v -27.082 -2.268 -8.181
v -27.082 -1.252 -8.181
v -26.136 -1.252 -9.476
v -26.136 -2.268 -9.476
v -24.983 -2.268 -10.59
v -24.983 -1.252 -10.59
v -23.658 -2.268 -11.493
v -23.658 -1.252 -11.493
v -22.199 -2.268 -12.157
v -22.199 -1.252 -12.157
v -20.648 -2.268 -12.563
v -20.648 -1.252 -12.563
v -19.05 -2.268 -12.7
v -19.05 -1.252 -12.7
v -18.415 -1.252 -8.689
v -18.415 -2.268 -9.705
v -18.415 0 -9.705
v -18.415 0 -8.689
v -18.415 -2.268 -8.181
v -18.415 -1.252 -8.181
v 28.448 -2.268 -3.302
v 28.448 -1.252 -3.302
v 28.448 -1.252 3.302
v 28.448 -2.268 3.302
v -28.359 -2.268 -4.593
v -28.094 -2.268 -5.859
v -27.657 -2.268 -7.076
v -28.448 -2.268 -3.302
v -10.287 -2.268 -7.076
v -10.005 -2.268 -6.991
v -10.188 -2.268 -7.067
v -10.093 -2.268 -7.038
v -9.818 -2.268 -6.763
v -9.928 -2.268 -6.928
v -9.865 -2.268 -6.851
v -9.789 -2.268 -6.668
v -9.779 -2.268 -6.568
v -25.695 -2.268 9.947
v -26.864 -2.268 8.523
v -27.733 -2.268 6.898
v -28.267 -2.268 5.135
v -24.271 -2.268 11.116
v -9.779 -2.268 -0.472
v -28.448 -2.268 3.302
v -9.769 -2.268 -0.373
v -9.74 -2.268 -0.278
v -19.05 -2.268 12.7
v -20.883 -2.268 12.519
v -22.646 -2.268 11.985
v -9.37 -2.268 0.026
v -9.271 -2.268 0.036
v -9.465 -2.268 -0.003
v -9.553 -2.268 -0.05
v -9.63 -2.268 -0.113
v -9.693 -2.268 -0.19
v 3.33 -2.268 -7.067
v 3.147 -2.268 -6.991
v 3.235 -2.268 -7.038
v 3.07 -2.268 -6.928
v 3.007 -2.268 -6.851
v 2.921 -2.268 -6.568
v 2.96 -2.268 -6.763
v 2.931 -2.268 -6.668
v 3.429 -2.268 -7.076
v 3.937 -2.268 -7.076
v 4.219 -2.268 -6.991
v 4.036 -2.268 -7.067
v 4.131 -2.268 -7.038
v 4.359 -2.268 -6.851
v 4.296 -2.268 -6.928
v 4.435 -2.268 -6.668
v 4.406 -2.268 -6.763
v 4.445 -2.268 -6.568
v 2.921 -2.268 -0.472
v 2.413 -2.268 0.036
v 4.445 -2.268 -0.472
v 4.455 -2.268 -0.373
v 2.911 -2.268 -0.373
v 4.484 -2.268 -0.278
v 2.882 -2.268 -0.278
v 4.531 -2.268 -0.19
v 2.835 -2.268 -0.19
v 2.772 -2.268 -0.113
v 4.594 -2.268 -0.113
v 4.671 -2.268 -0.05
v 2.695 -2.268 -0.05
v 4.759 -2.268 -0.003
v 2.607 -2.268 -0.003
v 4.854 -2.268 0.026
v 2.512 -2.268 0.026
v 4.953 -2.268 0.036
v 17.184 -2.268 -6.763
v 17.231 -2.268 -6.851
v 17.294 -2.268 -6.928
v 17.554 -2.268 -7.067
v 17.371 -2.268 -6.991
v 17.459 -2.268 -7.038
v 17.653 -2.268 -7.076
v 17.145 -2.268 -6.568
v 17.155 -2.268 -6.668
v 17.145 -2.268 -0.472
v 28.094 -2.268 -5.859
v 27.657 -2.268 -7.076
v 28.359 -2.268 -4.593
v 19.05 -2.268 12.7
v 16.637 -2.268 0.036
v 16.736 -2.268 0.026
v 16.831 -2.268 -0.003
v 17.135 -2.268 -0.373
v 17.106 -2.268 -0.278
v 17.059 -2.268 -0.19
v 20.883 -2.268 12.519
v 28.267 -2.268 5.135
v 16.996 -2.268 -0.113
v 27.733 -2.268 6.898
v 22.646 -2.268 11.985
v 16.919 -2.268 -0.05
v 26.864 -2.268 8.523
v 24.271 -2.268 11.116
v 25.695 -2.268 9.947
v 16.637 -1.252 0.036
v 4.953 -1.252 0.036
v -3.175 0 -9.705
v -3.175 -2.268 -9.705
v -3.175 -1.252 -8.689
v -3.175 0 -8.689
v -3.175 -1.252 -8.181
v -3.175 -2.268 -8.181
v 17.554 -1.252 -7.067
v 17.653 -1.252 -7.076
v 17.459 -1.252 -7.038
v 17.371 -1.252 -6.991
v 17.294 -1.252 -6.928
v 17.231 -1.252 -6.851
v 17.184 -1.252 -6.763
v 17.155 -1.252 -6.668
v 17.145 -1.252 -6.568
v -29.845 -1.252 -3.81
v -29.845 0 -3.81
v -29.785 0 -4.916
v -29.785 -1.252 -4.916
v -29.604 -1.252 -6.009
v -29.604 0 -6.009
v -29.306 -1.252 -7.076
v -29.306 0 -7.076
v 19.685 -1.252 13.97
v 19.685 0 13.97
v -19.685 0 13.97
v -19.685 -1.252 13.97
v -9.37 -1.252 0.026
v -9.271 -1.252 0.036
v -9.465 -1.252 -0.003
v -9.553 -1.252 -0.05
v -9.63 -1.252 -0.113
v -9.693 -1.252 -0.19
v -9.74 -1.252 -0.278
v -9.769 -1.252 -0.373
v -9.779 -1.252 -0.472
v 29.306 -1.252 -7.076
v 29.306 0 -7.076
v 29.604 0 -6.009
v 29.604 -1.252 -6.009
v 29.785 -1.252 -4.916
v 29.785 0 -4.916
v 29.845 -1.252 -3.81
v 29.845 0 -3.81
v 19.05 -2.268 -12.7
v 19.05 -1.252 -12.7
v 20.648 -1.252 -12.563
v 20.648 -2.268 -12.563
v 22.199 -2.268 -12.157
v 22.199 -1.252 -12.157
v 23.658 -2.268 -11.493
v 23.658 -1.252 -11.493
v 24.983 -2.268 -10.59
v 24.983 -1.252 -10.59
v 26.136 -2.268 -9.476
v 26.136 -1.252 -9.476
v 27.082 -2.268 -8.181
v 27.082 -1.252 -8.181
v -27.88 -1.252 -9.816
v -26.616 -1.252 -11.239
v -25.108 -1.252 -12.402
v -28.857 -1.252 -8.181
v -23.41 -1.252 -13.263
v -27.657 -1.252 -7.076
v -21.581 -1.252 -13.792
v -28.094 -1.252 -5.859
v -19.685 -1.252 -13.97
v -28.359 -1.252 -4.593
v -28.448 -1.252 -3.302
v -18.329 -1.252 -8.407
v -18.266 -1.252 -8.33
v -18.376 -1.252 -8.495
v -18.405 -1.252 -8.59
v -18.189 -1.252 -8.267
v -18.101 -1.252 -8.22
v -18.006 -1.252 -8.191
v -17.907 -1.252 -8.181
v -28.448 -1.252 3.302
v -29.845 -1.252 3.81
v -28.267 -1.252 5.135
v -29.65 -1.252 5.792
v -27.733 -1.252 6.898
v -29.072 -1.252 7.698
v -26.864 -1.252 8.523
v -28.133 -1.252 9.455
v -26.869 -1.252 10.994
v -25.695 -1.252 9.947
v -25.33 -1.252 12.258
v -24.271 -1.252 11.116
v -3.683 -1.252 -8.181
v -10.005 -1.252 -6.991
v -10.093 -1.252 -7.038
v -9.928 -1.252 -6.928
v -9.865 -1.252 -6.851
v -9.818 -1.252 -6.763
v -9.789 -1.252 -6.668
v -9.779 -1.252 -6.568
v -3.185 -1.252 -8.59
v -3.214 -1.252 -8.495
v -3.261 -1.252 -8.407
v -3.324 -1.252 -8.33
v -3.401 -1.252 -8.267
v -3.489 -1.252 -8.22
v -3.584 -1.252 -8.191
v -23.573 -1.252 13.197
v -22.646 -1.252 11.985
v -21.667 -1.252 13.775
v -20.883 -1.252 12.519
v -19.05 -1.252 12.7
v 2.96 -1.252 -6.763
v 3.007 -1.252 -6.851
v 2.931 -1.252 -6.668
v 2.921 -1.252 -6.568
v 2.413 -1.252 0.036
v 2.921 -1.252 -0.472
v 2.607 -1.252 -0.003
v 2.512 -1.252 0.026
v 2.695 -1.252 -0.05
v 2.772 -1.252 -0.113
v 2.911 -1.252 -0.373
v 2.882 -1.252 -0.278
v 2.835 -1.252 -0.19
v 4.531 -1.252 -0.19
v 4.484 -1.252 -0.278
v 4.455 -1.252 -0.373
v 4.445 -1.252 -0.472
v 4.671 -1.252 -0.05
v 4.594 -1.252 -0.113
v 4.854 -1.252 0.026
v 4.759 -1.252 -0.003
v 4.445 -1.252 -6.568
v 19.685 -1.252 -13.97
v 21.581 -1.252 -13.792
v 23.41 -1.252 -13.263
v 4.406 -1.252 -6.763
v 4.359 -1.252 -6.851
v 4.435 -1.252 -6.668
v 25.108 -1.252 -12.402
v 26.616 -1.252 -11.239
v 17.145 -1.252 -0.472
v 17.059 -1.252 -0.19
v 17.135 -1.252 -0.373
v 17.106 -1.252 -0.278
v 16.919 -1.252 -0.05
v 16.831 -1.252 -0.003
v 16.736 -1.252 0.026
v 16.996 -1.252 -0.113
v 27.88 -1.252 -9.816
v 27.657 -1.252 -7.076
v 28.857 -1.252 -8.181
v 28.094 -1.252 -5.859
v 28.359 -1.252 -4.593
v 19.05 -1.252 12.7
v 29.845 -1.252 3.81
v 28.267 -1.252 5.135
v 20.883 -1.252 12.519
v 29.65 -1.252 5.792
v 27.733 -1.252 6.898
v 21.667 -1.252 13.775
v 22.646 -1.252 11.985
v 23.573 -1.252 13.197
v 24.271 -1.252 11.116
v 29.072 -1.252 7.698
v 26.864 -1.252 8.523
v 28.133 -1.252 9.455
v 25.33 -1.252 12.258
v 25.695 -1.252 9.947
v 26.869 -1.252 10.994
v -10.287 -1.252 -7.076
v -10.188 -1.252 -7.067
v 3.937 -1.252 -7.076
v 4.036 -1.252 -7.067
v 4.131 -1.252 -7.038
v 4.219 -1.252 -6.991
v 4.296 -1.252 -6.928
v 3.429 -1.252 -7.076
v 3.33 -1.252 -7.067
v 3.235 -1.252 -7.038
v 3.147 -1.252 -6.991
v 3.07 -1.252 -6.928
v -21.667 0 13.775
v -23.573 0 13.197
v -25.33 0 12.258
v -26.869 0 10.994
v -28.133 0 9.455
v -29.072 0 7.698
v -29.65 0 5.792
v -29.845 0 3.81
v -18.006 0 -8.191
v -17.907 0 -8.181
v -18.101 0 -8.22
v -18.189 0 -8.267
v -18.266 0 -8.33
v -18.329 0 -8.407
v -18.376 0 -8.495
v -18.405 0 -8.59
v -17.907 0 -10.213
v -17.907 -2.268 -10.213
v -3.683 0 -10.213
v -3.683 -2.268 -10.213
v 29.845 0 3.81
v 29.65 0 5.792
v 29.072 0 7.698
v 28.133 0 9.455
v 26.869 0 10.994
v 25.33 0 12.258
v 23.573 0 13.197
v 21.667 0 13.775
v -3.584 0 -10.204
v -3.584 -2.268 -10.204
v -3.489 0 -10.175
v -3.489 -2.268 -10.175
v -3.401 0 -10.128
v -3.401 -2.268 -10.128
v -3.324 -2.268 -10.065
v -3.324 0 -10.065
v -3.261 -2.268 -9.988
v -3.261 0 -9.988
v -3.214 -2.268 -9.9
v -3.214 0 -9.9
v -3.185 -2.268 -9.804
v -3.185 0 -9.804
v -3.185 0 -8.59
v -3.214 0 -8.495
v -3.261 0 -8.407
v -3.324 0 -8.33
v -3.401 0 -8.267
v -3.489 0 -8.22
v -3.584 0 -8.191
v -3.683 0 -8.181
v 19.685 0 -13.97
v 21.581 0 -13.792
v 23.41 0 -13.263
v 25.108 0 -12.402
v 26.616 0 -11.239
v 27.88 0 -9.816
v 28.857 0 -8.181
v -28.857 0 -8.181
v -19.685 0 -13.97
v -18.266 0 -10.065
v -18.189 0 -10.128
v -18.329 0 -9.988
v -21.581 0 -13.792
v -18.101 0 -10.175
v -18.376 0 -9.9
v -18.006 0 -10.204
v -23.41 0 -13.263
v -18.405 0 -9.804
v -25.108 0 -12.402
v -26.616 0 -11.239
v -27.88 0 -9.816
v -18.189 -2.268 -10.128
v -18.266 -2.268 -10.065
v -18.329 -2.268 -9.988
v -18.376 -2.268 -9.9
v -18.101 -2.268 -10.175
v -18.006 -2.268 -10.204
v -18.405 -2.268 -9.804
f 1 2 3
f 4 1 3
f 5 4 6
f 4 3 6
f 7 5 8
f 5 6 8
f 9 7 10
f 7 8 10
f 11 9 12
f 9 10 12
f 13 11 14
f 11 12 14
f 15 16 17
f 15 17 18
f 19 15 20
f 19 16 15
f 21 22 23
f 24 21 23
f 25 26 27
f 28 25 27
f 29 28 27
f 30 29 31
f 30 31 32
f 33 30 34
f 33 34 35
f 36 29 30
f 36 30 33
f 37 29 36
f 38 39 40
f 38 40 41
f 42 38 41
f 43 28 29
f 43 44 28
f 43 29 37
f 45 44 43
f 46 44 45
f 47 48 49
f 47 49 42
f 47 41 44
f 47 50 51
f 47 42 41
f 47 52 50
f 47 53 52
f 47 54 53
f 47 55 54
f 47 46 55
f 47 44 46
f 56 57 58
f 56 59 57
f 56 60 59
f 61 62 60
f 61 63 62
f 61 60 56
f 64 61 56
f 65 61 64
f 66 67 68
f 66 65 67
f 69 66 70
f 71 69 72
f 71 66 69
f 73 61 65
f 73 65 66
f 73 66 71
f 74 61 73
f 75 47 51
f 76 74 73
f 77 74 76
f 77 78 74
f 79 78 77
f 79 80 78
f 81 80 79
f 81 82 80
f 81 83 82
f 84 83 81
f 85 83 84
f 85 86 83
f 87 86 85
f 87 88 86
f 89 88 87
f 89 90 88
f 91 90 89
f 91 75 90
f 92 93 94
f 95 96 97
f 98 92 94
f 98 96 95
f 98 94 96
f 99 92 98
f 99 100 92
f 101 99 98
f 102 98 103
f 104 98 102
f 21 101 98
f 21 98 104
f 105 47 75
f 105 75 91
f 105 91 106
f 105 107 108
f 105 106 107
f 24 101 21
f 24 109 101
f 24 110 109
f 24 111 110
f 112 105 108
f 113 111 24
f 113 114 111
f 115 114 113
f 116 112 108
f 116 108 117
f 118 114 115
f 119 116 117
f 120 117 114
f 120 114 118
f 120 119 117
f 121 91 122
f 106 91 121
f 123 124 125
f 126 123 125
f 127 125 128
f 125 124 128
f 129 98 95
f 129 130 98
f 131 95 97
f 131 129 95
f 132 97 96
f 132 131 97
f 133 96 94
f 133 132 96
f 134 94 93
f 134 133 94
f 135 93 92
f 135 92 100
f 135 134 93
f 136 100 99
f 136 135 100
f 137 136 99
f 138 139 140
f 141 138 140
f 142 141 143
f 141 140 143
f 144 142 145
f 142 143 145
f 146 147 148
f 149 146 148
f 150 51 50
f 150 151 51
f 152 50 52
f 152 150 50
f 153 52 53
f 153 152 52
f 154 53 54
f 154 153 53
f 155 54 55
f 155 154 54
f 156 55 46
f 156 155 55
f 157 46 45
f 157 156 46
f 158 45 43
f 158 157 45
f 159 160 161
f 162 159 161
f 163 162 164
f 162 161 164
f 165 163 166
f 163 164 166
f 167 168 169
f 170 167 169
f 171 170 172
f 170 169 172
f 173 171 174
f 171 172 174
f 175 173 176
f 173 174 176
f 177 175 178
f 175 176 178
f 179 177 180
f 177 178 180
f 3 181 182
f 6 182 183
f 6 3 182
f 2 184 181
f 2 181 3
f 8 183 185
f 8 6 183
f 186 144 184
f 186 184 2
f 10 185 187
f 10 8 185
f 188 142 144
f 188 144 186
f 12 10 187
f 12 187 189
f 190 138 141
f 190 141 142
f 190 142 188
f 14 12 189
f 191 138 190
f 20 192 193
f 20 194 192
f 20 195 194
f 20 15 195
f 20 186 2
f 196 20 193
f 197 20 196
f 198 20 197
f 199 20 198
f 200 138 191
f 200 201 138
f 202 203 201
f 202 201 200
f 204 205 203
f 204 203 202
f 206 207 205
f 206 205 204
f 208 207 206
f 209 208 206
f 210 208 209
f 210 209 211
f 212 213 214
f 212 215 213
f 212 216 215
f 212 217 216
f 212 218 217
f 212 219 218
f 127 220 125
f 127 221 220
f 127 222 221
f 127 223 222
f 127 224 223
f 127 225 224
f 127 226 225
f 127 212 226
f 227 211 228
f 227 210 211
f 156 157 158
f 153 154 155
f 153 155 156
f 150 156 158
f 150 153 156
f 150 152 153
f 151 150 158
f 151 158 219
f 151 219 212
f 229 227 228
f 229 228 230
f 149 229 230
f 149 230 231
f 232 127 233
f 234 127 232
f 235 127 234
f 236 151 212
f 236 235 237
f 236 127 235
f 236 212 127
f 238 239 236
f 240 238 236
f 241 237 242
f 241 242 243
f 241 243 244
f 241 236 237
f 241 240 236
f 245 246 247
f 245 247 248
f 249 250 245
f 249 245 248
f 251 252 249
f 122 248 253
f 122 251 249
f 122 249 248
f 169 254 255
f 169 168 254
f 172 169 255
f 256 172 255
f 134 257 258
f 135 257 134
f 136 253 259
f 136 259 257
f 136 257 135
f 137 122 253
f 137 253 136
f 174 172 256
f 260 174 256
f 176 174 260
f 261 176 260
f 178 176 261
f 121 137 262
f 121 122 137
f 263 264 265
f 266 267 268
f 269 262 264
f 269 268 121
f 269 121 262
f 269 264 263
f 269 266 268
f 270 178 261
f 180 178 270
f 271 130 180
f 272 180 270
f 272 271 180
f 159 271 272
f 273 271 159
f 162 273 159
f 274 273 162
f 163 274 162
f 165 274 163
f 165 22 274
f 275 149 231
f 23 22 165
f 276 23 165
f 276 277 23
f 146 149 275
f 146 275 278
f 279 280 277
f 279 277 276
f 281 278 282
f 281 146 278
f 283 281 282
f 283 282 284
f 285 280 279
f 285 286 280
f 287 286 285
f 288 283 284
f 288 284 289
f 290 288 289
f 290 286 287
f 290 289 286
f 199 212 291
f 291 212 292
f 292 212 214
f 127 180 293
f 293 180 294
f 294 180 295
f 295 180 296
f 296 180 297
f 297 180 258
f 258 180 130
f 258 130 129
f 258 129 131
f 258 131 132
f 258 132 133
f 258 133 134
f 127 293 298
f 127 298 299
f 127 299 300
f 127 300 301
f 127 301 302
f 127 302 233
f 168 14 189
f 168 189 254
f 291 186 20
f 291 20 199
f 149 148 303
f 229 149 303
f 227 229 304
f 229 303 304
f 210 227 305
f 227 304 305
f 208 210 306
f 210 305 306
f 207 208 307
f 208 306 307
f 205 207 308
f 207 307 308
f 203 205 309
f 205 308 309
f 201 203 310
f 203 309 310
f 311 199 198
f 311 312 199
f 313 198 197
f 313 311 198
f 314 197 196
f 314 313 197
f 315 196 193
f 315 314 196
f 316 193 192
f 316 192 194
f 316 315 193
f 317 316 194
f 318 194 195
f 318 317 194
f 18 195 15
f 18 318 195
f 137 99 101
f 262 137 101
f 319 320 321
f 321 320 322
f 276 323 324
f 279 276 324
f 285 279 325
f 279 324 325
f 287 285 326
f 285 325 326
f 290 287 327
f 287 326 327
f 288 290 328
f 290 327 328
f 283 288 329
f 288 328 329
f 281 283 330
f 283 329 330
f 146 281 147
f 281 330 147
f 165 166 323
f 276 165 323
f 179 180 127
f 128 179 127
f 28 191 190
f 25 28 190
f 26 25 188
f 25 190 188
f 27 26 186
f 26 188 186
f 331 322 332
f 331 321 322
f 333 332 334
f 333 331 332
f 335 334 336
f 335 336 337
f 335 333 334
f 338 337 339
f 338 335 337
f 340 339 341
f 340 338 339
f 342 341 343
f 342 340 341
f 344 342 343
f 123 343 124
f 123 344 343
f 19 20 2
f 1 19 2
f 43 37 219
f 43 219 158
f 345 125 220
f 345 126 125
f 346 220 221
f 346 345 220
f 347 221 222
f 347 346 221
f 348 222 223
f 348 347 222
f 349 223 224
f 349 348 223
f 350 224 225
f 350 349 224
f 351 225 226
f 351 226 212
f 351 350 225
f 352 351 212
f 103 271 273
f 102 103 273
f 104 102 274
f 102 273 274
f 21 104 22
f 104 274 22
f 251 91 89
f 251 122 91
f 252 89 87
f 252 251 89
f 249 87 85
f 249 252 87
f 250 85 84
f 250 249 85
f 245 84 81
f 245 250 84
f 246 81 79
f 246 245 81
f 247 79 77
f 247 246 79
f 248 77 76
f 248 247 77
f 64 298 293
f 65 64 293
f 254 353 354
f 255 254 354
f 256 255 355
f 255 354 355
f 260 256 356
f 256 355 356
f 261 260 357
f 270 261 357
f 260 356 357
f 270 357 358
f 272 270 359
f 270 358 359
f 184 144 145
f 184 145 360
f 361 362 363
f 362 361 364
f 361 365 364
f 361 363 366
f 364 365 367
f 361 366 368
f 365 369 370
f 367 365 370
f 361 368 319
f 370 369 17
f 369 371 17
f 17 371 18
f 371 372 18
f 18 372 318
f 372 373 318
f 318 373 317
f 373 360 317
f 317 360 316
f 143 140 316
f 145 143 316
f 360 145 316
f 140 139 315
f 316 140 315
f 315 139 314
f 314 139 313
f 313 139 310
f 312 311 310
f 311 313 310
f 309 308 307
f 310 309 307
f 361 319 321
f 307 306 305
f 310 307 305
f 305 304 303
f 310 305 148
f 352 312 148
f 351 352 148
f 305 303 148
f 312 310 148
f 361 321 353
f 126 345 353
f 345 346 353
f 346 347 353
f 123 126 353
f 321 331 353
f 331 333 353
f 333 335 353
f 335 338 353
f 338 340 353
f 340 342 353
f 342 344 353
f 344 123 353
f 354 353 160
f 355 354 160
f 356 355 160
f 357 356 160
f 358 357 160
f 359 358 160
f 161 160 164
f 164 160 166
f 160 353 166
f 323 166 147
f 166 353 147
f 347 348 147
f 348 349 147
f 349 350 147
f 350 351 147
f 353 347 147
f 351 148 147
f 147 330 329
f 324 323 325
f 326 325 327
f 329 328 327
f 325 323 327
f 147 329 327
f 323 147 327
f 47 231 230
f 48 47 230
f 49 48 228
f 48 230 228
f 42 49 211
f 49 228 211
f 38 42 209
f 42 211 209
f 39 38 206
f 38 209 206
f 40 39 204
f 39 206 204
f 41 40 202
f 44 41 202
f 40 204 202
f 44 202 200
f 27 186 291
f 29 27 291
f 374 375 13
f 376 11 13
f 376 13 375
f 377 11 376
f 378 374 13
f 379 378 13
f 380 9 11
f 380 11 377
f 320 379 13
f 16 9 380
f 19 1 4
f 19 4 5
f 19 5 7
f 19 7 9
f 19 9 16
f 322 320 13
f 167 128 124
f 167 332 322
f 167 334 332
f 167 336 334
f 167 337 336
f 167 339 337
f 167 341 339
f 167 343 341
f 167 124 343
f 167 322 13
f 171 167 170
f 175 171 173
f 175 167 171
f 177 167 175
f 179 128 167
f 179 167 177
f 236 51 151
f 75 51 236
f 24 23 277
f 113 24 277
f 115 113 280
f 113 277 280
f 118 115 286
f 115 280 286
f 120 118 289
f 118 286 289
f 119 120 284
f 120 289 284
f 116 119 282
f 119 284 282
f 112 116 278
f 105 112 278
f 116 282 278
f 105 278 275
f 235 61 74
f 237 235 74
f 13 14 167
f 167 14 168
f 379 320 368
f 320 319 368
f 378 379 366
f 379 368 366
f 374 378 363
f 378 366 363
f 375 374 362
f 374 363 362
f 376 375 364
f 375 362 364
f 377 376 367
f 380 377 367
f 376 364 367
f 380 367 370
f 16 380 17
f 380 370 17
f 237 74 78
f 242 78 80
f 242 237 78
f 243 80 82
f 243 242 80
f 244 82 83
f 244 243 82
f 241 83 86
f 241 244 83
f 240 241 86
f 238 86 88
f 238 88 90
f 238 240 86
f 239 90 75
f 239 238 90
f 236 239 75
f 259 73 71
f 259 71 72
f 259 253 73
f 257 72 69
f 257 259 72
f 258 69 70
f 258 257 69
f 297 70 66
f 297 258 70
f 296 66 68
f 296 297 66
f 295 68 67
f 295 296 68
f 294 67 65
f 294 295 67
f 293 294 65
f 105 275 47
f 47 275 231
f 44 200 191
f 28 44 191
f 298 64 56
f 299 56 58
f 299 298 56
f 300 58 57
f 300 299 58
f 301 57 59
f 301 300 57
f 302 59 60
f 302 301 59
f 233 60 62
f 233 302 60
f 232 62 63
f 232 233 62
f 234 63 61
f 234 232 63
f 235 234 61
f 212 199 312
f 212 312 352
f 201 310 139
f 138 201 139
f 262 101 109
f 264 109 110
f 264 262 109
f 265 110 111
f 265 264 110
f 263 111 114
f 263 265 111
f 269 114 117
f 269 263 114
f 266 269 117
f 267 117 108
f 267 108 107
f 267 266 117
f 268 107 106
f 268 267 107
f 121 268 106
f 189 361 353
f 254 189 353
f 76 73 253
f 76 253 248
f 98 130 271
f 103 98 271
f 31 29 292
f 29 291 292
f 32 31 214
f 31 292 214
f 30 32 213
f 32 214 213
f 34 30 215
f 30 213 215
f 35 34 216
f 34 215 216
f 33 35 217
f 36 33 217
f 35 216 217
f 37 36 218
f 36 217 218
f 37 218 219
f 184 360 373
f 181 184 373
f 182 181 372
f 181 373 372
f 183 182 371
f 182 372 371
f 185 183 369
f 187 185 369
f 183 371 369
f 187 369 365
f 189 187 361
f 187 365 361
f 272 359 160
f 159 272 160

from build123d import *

# Parameters (mm, degrees)
F1_DEPTH = 1.25222
F3_DEPTH = 1.016
F4_W     = 12.7
F4_H     = 7.112
F5_DEPTH = 1.016
F6_W     = 15.24
F6_H     = 2.032
F7_DEPTH = 25.4
F8_R     = 0.508


with BuildPart() as f1:
    # F0 (on Front) → F1 (new body)
    with BuildSketch(Plane.XZ):
        with BuildLine():
            Line((27.6567419321, -7.07644), (29.3056013183, -7.07644))
            ThreePointArc((29.3056013183, -7.07644), (29.7092433479, -5.4653384255), (29.845, -3.81))
            Line((29.845, -3.81), (29.845, 3.81))
            ThreePointArc((29.845, 3.81), (26.8692048969, 10.9942048969), (19.685, 13.97))
            Line((19.685, 13.97), (-19.685, 13.97))
            ThreePointArc((-19.685, 13.97), (-26.8692048969, 10.9942048969), (-29.845, 3.81))
            Line((-29.845, 3.81), (-29.845, -3.81))
            ThreePointArc((-29.845, -3.81), (-29.7092433479, -5.4653384255), (-29.3056013183, -7.07644))
            Line((-29.3056013183, -7.07644), (-27.6567419321, -7.07644))
            ThreePointArc((-27.6567419321, -7.07644), (-28.2480586179, -5.230243154), (-28.448, -3.302))
            Line((-28.448, -3.302), (-28.448, 3.302))
            ThreePointArc((-28.448, 3.302), (-25.6953895296, 9.9473895296), (-19.05, 12.7))
            Line((-19.05, 12.7), (19.05, 12.7))
            ThreePointArc((19.05, 12.7), (25.6953895296, 9.9473895296), (28.448, 3.302))
            Line((28.448, 3.302), (28.448, -3.302))
            ThreePointArc((28.448, -3.302), (28.2480586179, -5.230243154), (27.6567419321, -7.07644))
        make_face()
        with BuildLine():
            Line((-19.685, -13.97), (19.685, -13.97))
            ThreePointArc((19.685, -13.97), (25.1077661576, -12.4018104728), (28.8565313119, -8.18134))
            Line((28.8565313119, -8.18134), (27.0820884684, -8.18134))
            ThreePointArc((27.0820884684, -8.18134), (23.6579478448, -11.4928009779), (19.05, -12.7))
            Line((19.05, -12.7), (-19.05, -12.7))
            ThreePointArc((-19.05, -12.7), (-23.6579478448, -11.4928009779), (-27.0820884684, -8.18134))
            Line((-27.0820884684, -8.18134), (-28.8565313119, -8.18134))
            ThreePointArc((-28.8565313119, -8.18134), (-25.1077661576, -12.4018104728), (-19.685, -13.97))
        make_face()
        with BuildLine():
            Line((-29.3056013183, -7.07644), (-28.8565313119, -8.18134))
            Line((-28.8565313119, -8.18134), (-27.0820884684, -8.18134))
            ThreePointArc((-27.0820884684, -8.18134), (-27.3877377194, -7.6384194588), (-27.6567419321, -7.07644))
            Line((-27.6567419321, -7.07644), (-29.3056013183, -7.07644))
        make_face()
        with BuildLine():
            Line((27.0820884684, -8.18134), (28.8565313119, -8.18134))
            Line((28.8565313119, -8.18134), (29.3056013183, -7.07644))
            Line((29.3056013183, -7.07644), (27.6567419321, -7.07644))
            ThreePointArc((27.6567419321, -7.07644), (27.3877377194, -7.6384194588), (27.0820884684, -8.18134))
        make_face()
        with BuildLine():
            Line((-27.6567419321, -7.07644), (27.6567419321, -7.07644))
            ThreePointArc((27.6567419321, -7.07644), (28.2480586179, -5.230243154), (28.448, -3.302))
            Line((28.448, -3.302), (28.448, 3.302))
            ThreePointArc((28.448, 3.302), (25.6953895296, 9.9473895296), (19.05, 12.7))
            Line((19.05, 12.7), (-19.05, 12.7))
            ThreePointArc((-19.05, 12.7), (-25.6953895296, 9.9473895296), (-28.448, 3.302))
            Line((-28.448, 3.302), (-28.448, -3.302))
            ThreePointArc((-28.448, -3.302), (-28.2480586179, -5.230243154), (-27.6567419321, -7.07644))
        make_face()
        with BuildLine():
            Line((-27.0820884684, -8.18134), (27.0820884684, -8.18134))
            ThreePointArc((27.0820884684, -8.18134), (27.3877377194, -7.6384194588), (27.6567419321, -7.07644))
            Line((27.6567419321, -7.07644), (-27.6567419321, -7.07644))
            ThreePointArc((-27.6567419321, -7.07644), (-27.3877377194, -7.6384194588), (-27.0820884684, -8.18134))
        make_face()
        with BuildLine():
            ThreePointArc((19.05, -12.7), (23.6579478448, -11.4928009779), (27.0820884684, -8.18134))
            Line((27.0820884684, -8.18134), (-27.0820884684, -8.18134))
            ThreePointArc((-27.0820884684, -8.18134), (-23.6579478448, -11.4928009779), (-19.05, -12.7))
            Line((-19.05, -12.7), (19.05, -12.7))
        make_face()
    extrude(amount=F1_DEPTH)

    # F2 (on face) → F3 (join)
    with BuildSketch(Plane.XZ.offset(1.25222)):
        with BuildLine():
            Line((-19.05, -12.7), (19.05, -12.7))
            ThreePointArc((19.05, -12.7), (23.6579478448, -11.4928009779), (27.0820884684, -8.18134))
            Line((27.0820884684, -8.18134), (-27.0820884684, -8.18134))
            ThreePointArc((-27.0820884684, -8.18134), (-23.6579478448, -11.4928009779), (-19.05, -12.7))
        make_face()
        with BuildLine():
            Line((-27.6567419321, -7.07644), (27.6567419321, -7.07644))
            ThreePointArc((27.6567419321, -7.07644), (28.2480586179, -5.230243154), (28.448, -3.302))
            Line((28.448, -3.302), (28.448, 3.302))
            ThreePointArc((28.448, 3.302), (25.6953895296, 9.9473895296), (19.05, 12.7))
            Line((19.05, 12.7), (-19.05, 12.7))
            ThreePointArc((-19.05, 12.7), (-25.6953895296, 9.9473895296), (-28.448, 3.302))
            Line((-28.448, 3.302), (-28.448, -3.302))
            ThreePointArc((-28.448, -3.302), (-28.2480586179, -5.230243154), (-27.6567419321, -7.07644))
        make_face()
    extrude(amount=F3_DEPTH)

    # F4 (on face) → F5 (cut)
    with BuildSketch(Plane.XZ.offset(2.26822)):
        with Locations((-3.429, -3.52044)):
            Rectangle(F4_W, F4_H)
        with Locations((10.795, -3.52044)):
            Rectangle(F4_W, F4_H)
    extrude(amount=-F5_DEPTH, mode=Mode.SUBTRACT)

    # F6 (on face) → F7 (cut)
    with BuildSketch(Plane.XZ.offset(2.26822)):
        with Locations((-10.795, -9.19734)):
            Rectangle(F6_W, F6_H)
    extrude(amount=-F7_DEPTH, mode=Mode.SUBTRACT)

    # F8
    f8_edges = [f1.edges().sort_by_distance(p)[0] for p in [
        (17.145, -1.76022, -7.07644),
        (17.145, -1.76022, 0.03556),
        (4.445, -1.76022, -7.07644),
        (4.445, -1.76022, 0.03556),
        (-9.779, -1.76022, 0.03556),
        (2.921, -1.76022, 0.03556),
        (2.921, -1.76022, -7.07644),
        (-9.779, -1.76022, -7.07644),
        (-3.175, -1.13411, -10.21334),
        (-18.415, -0.62611, -8.18134),
        (-18.415, -1.13411, -10.21334),
        (-3.175, -0.62611, -8.18134),
    ]]
    fillet(f8_edges, radius=F8_R)


solid = f1.part
